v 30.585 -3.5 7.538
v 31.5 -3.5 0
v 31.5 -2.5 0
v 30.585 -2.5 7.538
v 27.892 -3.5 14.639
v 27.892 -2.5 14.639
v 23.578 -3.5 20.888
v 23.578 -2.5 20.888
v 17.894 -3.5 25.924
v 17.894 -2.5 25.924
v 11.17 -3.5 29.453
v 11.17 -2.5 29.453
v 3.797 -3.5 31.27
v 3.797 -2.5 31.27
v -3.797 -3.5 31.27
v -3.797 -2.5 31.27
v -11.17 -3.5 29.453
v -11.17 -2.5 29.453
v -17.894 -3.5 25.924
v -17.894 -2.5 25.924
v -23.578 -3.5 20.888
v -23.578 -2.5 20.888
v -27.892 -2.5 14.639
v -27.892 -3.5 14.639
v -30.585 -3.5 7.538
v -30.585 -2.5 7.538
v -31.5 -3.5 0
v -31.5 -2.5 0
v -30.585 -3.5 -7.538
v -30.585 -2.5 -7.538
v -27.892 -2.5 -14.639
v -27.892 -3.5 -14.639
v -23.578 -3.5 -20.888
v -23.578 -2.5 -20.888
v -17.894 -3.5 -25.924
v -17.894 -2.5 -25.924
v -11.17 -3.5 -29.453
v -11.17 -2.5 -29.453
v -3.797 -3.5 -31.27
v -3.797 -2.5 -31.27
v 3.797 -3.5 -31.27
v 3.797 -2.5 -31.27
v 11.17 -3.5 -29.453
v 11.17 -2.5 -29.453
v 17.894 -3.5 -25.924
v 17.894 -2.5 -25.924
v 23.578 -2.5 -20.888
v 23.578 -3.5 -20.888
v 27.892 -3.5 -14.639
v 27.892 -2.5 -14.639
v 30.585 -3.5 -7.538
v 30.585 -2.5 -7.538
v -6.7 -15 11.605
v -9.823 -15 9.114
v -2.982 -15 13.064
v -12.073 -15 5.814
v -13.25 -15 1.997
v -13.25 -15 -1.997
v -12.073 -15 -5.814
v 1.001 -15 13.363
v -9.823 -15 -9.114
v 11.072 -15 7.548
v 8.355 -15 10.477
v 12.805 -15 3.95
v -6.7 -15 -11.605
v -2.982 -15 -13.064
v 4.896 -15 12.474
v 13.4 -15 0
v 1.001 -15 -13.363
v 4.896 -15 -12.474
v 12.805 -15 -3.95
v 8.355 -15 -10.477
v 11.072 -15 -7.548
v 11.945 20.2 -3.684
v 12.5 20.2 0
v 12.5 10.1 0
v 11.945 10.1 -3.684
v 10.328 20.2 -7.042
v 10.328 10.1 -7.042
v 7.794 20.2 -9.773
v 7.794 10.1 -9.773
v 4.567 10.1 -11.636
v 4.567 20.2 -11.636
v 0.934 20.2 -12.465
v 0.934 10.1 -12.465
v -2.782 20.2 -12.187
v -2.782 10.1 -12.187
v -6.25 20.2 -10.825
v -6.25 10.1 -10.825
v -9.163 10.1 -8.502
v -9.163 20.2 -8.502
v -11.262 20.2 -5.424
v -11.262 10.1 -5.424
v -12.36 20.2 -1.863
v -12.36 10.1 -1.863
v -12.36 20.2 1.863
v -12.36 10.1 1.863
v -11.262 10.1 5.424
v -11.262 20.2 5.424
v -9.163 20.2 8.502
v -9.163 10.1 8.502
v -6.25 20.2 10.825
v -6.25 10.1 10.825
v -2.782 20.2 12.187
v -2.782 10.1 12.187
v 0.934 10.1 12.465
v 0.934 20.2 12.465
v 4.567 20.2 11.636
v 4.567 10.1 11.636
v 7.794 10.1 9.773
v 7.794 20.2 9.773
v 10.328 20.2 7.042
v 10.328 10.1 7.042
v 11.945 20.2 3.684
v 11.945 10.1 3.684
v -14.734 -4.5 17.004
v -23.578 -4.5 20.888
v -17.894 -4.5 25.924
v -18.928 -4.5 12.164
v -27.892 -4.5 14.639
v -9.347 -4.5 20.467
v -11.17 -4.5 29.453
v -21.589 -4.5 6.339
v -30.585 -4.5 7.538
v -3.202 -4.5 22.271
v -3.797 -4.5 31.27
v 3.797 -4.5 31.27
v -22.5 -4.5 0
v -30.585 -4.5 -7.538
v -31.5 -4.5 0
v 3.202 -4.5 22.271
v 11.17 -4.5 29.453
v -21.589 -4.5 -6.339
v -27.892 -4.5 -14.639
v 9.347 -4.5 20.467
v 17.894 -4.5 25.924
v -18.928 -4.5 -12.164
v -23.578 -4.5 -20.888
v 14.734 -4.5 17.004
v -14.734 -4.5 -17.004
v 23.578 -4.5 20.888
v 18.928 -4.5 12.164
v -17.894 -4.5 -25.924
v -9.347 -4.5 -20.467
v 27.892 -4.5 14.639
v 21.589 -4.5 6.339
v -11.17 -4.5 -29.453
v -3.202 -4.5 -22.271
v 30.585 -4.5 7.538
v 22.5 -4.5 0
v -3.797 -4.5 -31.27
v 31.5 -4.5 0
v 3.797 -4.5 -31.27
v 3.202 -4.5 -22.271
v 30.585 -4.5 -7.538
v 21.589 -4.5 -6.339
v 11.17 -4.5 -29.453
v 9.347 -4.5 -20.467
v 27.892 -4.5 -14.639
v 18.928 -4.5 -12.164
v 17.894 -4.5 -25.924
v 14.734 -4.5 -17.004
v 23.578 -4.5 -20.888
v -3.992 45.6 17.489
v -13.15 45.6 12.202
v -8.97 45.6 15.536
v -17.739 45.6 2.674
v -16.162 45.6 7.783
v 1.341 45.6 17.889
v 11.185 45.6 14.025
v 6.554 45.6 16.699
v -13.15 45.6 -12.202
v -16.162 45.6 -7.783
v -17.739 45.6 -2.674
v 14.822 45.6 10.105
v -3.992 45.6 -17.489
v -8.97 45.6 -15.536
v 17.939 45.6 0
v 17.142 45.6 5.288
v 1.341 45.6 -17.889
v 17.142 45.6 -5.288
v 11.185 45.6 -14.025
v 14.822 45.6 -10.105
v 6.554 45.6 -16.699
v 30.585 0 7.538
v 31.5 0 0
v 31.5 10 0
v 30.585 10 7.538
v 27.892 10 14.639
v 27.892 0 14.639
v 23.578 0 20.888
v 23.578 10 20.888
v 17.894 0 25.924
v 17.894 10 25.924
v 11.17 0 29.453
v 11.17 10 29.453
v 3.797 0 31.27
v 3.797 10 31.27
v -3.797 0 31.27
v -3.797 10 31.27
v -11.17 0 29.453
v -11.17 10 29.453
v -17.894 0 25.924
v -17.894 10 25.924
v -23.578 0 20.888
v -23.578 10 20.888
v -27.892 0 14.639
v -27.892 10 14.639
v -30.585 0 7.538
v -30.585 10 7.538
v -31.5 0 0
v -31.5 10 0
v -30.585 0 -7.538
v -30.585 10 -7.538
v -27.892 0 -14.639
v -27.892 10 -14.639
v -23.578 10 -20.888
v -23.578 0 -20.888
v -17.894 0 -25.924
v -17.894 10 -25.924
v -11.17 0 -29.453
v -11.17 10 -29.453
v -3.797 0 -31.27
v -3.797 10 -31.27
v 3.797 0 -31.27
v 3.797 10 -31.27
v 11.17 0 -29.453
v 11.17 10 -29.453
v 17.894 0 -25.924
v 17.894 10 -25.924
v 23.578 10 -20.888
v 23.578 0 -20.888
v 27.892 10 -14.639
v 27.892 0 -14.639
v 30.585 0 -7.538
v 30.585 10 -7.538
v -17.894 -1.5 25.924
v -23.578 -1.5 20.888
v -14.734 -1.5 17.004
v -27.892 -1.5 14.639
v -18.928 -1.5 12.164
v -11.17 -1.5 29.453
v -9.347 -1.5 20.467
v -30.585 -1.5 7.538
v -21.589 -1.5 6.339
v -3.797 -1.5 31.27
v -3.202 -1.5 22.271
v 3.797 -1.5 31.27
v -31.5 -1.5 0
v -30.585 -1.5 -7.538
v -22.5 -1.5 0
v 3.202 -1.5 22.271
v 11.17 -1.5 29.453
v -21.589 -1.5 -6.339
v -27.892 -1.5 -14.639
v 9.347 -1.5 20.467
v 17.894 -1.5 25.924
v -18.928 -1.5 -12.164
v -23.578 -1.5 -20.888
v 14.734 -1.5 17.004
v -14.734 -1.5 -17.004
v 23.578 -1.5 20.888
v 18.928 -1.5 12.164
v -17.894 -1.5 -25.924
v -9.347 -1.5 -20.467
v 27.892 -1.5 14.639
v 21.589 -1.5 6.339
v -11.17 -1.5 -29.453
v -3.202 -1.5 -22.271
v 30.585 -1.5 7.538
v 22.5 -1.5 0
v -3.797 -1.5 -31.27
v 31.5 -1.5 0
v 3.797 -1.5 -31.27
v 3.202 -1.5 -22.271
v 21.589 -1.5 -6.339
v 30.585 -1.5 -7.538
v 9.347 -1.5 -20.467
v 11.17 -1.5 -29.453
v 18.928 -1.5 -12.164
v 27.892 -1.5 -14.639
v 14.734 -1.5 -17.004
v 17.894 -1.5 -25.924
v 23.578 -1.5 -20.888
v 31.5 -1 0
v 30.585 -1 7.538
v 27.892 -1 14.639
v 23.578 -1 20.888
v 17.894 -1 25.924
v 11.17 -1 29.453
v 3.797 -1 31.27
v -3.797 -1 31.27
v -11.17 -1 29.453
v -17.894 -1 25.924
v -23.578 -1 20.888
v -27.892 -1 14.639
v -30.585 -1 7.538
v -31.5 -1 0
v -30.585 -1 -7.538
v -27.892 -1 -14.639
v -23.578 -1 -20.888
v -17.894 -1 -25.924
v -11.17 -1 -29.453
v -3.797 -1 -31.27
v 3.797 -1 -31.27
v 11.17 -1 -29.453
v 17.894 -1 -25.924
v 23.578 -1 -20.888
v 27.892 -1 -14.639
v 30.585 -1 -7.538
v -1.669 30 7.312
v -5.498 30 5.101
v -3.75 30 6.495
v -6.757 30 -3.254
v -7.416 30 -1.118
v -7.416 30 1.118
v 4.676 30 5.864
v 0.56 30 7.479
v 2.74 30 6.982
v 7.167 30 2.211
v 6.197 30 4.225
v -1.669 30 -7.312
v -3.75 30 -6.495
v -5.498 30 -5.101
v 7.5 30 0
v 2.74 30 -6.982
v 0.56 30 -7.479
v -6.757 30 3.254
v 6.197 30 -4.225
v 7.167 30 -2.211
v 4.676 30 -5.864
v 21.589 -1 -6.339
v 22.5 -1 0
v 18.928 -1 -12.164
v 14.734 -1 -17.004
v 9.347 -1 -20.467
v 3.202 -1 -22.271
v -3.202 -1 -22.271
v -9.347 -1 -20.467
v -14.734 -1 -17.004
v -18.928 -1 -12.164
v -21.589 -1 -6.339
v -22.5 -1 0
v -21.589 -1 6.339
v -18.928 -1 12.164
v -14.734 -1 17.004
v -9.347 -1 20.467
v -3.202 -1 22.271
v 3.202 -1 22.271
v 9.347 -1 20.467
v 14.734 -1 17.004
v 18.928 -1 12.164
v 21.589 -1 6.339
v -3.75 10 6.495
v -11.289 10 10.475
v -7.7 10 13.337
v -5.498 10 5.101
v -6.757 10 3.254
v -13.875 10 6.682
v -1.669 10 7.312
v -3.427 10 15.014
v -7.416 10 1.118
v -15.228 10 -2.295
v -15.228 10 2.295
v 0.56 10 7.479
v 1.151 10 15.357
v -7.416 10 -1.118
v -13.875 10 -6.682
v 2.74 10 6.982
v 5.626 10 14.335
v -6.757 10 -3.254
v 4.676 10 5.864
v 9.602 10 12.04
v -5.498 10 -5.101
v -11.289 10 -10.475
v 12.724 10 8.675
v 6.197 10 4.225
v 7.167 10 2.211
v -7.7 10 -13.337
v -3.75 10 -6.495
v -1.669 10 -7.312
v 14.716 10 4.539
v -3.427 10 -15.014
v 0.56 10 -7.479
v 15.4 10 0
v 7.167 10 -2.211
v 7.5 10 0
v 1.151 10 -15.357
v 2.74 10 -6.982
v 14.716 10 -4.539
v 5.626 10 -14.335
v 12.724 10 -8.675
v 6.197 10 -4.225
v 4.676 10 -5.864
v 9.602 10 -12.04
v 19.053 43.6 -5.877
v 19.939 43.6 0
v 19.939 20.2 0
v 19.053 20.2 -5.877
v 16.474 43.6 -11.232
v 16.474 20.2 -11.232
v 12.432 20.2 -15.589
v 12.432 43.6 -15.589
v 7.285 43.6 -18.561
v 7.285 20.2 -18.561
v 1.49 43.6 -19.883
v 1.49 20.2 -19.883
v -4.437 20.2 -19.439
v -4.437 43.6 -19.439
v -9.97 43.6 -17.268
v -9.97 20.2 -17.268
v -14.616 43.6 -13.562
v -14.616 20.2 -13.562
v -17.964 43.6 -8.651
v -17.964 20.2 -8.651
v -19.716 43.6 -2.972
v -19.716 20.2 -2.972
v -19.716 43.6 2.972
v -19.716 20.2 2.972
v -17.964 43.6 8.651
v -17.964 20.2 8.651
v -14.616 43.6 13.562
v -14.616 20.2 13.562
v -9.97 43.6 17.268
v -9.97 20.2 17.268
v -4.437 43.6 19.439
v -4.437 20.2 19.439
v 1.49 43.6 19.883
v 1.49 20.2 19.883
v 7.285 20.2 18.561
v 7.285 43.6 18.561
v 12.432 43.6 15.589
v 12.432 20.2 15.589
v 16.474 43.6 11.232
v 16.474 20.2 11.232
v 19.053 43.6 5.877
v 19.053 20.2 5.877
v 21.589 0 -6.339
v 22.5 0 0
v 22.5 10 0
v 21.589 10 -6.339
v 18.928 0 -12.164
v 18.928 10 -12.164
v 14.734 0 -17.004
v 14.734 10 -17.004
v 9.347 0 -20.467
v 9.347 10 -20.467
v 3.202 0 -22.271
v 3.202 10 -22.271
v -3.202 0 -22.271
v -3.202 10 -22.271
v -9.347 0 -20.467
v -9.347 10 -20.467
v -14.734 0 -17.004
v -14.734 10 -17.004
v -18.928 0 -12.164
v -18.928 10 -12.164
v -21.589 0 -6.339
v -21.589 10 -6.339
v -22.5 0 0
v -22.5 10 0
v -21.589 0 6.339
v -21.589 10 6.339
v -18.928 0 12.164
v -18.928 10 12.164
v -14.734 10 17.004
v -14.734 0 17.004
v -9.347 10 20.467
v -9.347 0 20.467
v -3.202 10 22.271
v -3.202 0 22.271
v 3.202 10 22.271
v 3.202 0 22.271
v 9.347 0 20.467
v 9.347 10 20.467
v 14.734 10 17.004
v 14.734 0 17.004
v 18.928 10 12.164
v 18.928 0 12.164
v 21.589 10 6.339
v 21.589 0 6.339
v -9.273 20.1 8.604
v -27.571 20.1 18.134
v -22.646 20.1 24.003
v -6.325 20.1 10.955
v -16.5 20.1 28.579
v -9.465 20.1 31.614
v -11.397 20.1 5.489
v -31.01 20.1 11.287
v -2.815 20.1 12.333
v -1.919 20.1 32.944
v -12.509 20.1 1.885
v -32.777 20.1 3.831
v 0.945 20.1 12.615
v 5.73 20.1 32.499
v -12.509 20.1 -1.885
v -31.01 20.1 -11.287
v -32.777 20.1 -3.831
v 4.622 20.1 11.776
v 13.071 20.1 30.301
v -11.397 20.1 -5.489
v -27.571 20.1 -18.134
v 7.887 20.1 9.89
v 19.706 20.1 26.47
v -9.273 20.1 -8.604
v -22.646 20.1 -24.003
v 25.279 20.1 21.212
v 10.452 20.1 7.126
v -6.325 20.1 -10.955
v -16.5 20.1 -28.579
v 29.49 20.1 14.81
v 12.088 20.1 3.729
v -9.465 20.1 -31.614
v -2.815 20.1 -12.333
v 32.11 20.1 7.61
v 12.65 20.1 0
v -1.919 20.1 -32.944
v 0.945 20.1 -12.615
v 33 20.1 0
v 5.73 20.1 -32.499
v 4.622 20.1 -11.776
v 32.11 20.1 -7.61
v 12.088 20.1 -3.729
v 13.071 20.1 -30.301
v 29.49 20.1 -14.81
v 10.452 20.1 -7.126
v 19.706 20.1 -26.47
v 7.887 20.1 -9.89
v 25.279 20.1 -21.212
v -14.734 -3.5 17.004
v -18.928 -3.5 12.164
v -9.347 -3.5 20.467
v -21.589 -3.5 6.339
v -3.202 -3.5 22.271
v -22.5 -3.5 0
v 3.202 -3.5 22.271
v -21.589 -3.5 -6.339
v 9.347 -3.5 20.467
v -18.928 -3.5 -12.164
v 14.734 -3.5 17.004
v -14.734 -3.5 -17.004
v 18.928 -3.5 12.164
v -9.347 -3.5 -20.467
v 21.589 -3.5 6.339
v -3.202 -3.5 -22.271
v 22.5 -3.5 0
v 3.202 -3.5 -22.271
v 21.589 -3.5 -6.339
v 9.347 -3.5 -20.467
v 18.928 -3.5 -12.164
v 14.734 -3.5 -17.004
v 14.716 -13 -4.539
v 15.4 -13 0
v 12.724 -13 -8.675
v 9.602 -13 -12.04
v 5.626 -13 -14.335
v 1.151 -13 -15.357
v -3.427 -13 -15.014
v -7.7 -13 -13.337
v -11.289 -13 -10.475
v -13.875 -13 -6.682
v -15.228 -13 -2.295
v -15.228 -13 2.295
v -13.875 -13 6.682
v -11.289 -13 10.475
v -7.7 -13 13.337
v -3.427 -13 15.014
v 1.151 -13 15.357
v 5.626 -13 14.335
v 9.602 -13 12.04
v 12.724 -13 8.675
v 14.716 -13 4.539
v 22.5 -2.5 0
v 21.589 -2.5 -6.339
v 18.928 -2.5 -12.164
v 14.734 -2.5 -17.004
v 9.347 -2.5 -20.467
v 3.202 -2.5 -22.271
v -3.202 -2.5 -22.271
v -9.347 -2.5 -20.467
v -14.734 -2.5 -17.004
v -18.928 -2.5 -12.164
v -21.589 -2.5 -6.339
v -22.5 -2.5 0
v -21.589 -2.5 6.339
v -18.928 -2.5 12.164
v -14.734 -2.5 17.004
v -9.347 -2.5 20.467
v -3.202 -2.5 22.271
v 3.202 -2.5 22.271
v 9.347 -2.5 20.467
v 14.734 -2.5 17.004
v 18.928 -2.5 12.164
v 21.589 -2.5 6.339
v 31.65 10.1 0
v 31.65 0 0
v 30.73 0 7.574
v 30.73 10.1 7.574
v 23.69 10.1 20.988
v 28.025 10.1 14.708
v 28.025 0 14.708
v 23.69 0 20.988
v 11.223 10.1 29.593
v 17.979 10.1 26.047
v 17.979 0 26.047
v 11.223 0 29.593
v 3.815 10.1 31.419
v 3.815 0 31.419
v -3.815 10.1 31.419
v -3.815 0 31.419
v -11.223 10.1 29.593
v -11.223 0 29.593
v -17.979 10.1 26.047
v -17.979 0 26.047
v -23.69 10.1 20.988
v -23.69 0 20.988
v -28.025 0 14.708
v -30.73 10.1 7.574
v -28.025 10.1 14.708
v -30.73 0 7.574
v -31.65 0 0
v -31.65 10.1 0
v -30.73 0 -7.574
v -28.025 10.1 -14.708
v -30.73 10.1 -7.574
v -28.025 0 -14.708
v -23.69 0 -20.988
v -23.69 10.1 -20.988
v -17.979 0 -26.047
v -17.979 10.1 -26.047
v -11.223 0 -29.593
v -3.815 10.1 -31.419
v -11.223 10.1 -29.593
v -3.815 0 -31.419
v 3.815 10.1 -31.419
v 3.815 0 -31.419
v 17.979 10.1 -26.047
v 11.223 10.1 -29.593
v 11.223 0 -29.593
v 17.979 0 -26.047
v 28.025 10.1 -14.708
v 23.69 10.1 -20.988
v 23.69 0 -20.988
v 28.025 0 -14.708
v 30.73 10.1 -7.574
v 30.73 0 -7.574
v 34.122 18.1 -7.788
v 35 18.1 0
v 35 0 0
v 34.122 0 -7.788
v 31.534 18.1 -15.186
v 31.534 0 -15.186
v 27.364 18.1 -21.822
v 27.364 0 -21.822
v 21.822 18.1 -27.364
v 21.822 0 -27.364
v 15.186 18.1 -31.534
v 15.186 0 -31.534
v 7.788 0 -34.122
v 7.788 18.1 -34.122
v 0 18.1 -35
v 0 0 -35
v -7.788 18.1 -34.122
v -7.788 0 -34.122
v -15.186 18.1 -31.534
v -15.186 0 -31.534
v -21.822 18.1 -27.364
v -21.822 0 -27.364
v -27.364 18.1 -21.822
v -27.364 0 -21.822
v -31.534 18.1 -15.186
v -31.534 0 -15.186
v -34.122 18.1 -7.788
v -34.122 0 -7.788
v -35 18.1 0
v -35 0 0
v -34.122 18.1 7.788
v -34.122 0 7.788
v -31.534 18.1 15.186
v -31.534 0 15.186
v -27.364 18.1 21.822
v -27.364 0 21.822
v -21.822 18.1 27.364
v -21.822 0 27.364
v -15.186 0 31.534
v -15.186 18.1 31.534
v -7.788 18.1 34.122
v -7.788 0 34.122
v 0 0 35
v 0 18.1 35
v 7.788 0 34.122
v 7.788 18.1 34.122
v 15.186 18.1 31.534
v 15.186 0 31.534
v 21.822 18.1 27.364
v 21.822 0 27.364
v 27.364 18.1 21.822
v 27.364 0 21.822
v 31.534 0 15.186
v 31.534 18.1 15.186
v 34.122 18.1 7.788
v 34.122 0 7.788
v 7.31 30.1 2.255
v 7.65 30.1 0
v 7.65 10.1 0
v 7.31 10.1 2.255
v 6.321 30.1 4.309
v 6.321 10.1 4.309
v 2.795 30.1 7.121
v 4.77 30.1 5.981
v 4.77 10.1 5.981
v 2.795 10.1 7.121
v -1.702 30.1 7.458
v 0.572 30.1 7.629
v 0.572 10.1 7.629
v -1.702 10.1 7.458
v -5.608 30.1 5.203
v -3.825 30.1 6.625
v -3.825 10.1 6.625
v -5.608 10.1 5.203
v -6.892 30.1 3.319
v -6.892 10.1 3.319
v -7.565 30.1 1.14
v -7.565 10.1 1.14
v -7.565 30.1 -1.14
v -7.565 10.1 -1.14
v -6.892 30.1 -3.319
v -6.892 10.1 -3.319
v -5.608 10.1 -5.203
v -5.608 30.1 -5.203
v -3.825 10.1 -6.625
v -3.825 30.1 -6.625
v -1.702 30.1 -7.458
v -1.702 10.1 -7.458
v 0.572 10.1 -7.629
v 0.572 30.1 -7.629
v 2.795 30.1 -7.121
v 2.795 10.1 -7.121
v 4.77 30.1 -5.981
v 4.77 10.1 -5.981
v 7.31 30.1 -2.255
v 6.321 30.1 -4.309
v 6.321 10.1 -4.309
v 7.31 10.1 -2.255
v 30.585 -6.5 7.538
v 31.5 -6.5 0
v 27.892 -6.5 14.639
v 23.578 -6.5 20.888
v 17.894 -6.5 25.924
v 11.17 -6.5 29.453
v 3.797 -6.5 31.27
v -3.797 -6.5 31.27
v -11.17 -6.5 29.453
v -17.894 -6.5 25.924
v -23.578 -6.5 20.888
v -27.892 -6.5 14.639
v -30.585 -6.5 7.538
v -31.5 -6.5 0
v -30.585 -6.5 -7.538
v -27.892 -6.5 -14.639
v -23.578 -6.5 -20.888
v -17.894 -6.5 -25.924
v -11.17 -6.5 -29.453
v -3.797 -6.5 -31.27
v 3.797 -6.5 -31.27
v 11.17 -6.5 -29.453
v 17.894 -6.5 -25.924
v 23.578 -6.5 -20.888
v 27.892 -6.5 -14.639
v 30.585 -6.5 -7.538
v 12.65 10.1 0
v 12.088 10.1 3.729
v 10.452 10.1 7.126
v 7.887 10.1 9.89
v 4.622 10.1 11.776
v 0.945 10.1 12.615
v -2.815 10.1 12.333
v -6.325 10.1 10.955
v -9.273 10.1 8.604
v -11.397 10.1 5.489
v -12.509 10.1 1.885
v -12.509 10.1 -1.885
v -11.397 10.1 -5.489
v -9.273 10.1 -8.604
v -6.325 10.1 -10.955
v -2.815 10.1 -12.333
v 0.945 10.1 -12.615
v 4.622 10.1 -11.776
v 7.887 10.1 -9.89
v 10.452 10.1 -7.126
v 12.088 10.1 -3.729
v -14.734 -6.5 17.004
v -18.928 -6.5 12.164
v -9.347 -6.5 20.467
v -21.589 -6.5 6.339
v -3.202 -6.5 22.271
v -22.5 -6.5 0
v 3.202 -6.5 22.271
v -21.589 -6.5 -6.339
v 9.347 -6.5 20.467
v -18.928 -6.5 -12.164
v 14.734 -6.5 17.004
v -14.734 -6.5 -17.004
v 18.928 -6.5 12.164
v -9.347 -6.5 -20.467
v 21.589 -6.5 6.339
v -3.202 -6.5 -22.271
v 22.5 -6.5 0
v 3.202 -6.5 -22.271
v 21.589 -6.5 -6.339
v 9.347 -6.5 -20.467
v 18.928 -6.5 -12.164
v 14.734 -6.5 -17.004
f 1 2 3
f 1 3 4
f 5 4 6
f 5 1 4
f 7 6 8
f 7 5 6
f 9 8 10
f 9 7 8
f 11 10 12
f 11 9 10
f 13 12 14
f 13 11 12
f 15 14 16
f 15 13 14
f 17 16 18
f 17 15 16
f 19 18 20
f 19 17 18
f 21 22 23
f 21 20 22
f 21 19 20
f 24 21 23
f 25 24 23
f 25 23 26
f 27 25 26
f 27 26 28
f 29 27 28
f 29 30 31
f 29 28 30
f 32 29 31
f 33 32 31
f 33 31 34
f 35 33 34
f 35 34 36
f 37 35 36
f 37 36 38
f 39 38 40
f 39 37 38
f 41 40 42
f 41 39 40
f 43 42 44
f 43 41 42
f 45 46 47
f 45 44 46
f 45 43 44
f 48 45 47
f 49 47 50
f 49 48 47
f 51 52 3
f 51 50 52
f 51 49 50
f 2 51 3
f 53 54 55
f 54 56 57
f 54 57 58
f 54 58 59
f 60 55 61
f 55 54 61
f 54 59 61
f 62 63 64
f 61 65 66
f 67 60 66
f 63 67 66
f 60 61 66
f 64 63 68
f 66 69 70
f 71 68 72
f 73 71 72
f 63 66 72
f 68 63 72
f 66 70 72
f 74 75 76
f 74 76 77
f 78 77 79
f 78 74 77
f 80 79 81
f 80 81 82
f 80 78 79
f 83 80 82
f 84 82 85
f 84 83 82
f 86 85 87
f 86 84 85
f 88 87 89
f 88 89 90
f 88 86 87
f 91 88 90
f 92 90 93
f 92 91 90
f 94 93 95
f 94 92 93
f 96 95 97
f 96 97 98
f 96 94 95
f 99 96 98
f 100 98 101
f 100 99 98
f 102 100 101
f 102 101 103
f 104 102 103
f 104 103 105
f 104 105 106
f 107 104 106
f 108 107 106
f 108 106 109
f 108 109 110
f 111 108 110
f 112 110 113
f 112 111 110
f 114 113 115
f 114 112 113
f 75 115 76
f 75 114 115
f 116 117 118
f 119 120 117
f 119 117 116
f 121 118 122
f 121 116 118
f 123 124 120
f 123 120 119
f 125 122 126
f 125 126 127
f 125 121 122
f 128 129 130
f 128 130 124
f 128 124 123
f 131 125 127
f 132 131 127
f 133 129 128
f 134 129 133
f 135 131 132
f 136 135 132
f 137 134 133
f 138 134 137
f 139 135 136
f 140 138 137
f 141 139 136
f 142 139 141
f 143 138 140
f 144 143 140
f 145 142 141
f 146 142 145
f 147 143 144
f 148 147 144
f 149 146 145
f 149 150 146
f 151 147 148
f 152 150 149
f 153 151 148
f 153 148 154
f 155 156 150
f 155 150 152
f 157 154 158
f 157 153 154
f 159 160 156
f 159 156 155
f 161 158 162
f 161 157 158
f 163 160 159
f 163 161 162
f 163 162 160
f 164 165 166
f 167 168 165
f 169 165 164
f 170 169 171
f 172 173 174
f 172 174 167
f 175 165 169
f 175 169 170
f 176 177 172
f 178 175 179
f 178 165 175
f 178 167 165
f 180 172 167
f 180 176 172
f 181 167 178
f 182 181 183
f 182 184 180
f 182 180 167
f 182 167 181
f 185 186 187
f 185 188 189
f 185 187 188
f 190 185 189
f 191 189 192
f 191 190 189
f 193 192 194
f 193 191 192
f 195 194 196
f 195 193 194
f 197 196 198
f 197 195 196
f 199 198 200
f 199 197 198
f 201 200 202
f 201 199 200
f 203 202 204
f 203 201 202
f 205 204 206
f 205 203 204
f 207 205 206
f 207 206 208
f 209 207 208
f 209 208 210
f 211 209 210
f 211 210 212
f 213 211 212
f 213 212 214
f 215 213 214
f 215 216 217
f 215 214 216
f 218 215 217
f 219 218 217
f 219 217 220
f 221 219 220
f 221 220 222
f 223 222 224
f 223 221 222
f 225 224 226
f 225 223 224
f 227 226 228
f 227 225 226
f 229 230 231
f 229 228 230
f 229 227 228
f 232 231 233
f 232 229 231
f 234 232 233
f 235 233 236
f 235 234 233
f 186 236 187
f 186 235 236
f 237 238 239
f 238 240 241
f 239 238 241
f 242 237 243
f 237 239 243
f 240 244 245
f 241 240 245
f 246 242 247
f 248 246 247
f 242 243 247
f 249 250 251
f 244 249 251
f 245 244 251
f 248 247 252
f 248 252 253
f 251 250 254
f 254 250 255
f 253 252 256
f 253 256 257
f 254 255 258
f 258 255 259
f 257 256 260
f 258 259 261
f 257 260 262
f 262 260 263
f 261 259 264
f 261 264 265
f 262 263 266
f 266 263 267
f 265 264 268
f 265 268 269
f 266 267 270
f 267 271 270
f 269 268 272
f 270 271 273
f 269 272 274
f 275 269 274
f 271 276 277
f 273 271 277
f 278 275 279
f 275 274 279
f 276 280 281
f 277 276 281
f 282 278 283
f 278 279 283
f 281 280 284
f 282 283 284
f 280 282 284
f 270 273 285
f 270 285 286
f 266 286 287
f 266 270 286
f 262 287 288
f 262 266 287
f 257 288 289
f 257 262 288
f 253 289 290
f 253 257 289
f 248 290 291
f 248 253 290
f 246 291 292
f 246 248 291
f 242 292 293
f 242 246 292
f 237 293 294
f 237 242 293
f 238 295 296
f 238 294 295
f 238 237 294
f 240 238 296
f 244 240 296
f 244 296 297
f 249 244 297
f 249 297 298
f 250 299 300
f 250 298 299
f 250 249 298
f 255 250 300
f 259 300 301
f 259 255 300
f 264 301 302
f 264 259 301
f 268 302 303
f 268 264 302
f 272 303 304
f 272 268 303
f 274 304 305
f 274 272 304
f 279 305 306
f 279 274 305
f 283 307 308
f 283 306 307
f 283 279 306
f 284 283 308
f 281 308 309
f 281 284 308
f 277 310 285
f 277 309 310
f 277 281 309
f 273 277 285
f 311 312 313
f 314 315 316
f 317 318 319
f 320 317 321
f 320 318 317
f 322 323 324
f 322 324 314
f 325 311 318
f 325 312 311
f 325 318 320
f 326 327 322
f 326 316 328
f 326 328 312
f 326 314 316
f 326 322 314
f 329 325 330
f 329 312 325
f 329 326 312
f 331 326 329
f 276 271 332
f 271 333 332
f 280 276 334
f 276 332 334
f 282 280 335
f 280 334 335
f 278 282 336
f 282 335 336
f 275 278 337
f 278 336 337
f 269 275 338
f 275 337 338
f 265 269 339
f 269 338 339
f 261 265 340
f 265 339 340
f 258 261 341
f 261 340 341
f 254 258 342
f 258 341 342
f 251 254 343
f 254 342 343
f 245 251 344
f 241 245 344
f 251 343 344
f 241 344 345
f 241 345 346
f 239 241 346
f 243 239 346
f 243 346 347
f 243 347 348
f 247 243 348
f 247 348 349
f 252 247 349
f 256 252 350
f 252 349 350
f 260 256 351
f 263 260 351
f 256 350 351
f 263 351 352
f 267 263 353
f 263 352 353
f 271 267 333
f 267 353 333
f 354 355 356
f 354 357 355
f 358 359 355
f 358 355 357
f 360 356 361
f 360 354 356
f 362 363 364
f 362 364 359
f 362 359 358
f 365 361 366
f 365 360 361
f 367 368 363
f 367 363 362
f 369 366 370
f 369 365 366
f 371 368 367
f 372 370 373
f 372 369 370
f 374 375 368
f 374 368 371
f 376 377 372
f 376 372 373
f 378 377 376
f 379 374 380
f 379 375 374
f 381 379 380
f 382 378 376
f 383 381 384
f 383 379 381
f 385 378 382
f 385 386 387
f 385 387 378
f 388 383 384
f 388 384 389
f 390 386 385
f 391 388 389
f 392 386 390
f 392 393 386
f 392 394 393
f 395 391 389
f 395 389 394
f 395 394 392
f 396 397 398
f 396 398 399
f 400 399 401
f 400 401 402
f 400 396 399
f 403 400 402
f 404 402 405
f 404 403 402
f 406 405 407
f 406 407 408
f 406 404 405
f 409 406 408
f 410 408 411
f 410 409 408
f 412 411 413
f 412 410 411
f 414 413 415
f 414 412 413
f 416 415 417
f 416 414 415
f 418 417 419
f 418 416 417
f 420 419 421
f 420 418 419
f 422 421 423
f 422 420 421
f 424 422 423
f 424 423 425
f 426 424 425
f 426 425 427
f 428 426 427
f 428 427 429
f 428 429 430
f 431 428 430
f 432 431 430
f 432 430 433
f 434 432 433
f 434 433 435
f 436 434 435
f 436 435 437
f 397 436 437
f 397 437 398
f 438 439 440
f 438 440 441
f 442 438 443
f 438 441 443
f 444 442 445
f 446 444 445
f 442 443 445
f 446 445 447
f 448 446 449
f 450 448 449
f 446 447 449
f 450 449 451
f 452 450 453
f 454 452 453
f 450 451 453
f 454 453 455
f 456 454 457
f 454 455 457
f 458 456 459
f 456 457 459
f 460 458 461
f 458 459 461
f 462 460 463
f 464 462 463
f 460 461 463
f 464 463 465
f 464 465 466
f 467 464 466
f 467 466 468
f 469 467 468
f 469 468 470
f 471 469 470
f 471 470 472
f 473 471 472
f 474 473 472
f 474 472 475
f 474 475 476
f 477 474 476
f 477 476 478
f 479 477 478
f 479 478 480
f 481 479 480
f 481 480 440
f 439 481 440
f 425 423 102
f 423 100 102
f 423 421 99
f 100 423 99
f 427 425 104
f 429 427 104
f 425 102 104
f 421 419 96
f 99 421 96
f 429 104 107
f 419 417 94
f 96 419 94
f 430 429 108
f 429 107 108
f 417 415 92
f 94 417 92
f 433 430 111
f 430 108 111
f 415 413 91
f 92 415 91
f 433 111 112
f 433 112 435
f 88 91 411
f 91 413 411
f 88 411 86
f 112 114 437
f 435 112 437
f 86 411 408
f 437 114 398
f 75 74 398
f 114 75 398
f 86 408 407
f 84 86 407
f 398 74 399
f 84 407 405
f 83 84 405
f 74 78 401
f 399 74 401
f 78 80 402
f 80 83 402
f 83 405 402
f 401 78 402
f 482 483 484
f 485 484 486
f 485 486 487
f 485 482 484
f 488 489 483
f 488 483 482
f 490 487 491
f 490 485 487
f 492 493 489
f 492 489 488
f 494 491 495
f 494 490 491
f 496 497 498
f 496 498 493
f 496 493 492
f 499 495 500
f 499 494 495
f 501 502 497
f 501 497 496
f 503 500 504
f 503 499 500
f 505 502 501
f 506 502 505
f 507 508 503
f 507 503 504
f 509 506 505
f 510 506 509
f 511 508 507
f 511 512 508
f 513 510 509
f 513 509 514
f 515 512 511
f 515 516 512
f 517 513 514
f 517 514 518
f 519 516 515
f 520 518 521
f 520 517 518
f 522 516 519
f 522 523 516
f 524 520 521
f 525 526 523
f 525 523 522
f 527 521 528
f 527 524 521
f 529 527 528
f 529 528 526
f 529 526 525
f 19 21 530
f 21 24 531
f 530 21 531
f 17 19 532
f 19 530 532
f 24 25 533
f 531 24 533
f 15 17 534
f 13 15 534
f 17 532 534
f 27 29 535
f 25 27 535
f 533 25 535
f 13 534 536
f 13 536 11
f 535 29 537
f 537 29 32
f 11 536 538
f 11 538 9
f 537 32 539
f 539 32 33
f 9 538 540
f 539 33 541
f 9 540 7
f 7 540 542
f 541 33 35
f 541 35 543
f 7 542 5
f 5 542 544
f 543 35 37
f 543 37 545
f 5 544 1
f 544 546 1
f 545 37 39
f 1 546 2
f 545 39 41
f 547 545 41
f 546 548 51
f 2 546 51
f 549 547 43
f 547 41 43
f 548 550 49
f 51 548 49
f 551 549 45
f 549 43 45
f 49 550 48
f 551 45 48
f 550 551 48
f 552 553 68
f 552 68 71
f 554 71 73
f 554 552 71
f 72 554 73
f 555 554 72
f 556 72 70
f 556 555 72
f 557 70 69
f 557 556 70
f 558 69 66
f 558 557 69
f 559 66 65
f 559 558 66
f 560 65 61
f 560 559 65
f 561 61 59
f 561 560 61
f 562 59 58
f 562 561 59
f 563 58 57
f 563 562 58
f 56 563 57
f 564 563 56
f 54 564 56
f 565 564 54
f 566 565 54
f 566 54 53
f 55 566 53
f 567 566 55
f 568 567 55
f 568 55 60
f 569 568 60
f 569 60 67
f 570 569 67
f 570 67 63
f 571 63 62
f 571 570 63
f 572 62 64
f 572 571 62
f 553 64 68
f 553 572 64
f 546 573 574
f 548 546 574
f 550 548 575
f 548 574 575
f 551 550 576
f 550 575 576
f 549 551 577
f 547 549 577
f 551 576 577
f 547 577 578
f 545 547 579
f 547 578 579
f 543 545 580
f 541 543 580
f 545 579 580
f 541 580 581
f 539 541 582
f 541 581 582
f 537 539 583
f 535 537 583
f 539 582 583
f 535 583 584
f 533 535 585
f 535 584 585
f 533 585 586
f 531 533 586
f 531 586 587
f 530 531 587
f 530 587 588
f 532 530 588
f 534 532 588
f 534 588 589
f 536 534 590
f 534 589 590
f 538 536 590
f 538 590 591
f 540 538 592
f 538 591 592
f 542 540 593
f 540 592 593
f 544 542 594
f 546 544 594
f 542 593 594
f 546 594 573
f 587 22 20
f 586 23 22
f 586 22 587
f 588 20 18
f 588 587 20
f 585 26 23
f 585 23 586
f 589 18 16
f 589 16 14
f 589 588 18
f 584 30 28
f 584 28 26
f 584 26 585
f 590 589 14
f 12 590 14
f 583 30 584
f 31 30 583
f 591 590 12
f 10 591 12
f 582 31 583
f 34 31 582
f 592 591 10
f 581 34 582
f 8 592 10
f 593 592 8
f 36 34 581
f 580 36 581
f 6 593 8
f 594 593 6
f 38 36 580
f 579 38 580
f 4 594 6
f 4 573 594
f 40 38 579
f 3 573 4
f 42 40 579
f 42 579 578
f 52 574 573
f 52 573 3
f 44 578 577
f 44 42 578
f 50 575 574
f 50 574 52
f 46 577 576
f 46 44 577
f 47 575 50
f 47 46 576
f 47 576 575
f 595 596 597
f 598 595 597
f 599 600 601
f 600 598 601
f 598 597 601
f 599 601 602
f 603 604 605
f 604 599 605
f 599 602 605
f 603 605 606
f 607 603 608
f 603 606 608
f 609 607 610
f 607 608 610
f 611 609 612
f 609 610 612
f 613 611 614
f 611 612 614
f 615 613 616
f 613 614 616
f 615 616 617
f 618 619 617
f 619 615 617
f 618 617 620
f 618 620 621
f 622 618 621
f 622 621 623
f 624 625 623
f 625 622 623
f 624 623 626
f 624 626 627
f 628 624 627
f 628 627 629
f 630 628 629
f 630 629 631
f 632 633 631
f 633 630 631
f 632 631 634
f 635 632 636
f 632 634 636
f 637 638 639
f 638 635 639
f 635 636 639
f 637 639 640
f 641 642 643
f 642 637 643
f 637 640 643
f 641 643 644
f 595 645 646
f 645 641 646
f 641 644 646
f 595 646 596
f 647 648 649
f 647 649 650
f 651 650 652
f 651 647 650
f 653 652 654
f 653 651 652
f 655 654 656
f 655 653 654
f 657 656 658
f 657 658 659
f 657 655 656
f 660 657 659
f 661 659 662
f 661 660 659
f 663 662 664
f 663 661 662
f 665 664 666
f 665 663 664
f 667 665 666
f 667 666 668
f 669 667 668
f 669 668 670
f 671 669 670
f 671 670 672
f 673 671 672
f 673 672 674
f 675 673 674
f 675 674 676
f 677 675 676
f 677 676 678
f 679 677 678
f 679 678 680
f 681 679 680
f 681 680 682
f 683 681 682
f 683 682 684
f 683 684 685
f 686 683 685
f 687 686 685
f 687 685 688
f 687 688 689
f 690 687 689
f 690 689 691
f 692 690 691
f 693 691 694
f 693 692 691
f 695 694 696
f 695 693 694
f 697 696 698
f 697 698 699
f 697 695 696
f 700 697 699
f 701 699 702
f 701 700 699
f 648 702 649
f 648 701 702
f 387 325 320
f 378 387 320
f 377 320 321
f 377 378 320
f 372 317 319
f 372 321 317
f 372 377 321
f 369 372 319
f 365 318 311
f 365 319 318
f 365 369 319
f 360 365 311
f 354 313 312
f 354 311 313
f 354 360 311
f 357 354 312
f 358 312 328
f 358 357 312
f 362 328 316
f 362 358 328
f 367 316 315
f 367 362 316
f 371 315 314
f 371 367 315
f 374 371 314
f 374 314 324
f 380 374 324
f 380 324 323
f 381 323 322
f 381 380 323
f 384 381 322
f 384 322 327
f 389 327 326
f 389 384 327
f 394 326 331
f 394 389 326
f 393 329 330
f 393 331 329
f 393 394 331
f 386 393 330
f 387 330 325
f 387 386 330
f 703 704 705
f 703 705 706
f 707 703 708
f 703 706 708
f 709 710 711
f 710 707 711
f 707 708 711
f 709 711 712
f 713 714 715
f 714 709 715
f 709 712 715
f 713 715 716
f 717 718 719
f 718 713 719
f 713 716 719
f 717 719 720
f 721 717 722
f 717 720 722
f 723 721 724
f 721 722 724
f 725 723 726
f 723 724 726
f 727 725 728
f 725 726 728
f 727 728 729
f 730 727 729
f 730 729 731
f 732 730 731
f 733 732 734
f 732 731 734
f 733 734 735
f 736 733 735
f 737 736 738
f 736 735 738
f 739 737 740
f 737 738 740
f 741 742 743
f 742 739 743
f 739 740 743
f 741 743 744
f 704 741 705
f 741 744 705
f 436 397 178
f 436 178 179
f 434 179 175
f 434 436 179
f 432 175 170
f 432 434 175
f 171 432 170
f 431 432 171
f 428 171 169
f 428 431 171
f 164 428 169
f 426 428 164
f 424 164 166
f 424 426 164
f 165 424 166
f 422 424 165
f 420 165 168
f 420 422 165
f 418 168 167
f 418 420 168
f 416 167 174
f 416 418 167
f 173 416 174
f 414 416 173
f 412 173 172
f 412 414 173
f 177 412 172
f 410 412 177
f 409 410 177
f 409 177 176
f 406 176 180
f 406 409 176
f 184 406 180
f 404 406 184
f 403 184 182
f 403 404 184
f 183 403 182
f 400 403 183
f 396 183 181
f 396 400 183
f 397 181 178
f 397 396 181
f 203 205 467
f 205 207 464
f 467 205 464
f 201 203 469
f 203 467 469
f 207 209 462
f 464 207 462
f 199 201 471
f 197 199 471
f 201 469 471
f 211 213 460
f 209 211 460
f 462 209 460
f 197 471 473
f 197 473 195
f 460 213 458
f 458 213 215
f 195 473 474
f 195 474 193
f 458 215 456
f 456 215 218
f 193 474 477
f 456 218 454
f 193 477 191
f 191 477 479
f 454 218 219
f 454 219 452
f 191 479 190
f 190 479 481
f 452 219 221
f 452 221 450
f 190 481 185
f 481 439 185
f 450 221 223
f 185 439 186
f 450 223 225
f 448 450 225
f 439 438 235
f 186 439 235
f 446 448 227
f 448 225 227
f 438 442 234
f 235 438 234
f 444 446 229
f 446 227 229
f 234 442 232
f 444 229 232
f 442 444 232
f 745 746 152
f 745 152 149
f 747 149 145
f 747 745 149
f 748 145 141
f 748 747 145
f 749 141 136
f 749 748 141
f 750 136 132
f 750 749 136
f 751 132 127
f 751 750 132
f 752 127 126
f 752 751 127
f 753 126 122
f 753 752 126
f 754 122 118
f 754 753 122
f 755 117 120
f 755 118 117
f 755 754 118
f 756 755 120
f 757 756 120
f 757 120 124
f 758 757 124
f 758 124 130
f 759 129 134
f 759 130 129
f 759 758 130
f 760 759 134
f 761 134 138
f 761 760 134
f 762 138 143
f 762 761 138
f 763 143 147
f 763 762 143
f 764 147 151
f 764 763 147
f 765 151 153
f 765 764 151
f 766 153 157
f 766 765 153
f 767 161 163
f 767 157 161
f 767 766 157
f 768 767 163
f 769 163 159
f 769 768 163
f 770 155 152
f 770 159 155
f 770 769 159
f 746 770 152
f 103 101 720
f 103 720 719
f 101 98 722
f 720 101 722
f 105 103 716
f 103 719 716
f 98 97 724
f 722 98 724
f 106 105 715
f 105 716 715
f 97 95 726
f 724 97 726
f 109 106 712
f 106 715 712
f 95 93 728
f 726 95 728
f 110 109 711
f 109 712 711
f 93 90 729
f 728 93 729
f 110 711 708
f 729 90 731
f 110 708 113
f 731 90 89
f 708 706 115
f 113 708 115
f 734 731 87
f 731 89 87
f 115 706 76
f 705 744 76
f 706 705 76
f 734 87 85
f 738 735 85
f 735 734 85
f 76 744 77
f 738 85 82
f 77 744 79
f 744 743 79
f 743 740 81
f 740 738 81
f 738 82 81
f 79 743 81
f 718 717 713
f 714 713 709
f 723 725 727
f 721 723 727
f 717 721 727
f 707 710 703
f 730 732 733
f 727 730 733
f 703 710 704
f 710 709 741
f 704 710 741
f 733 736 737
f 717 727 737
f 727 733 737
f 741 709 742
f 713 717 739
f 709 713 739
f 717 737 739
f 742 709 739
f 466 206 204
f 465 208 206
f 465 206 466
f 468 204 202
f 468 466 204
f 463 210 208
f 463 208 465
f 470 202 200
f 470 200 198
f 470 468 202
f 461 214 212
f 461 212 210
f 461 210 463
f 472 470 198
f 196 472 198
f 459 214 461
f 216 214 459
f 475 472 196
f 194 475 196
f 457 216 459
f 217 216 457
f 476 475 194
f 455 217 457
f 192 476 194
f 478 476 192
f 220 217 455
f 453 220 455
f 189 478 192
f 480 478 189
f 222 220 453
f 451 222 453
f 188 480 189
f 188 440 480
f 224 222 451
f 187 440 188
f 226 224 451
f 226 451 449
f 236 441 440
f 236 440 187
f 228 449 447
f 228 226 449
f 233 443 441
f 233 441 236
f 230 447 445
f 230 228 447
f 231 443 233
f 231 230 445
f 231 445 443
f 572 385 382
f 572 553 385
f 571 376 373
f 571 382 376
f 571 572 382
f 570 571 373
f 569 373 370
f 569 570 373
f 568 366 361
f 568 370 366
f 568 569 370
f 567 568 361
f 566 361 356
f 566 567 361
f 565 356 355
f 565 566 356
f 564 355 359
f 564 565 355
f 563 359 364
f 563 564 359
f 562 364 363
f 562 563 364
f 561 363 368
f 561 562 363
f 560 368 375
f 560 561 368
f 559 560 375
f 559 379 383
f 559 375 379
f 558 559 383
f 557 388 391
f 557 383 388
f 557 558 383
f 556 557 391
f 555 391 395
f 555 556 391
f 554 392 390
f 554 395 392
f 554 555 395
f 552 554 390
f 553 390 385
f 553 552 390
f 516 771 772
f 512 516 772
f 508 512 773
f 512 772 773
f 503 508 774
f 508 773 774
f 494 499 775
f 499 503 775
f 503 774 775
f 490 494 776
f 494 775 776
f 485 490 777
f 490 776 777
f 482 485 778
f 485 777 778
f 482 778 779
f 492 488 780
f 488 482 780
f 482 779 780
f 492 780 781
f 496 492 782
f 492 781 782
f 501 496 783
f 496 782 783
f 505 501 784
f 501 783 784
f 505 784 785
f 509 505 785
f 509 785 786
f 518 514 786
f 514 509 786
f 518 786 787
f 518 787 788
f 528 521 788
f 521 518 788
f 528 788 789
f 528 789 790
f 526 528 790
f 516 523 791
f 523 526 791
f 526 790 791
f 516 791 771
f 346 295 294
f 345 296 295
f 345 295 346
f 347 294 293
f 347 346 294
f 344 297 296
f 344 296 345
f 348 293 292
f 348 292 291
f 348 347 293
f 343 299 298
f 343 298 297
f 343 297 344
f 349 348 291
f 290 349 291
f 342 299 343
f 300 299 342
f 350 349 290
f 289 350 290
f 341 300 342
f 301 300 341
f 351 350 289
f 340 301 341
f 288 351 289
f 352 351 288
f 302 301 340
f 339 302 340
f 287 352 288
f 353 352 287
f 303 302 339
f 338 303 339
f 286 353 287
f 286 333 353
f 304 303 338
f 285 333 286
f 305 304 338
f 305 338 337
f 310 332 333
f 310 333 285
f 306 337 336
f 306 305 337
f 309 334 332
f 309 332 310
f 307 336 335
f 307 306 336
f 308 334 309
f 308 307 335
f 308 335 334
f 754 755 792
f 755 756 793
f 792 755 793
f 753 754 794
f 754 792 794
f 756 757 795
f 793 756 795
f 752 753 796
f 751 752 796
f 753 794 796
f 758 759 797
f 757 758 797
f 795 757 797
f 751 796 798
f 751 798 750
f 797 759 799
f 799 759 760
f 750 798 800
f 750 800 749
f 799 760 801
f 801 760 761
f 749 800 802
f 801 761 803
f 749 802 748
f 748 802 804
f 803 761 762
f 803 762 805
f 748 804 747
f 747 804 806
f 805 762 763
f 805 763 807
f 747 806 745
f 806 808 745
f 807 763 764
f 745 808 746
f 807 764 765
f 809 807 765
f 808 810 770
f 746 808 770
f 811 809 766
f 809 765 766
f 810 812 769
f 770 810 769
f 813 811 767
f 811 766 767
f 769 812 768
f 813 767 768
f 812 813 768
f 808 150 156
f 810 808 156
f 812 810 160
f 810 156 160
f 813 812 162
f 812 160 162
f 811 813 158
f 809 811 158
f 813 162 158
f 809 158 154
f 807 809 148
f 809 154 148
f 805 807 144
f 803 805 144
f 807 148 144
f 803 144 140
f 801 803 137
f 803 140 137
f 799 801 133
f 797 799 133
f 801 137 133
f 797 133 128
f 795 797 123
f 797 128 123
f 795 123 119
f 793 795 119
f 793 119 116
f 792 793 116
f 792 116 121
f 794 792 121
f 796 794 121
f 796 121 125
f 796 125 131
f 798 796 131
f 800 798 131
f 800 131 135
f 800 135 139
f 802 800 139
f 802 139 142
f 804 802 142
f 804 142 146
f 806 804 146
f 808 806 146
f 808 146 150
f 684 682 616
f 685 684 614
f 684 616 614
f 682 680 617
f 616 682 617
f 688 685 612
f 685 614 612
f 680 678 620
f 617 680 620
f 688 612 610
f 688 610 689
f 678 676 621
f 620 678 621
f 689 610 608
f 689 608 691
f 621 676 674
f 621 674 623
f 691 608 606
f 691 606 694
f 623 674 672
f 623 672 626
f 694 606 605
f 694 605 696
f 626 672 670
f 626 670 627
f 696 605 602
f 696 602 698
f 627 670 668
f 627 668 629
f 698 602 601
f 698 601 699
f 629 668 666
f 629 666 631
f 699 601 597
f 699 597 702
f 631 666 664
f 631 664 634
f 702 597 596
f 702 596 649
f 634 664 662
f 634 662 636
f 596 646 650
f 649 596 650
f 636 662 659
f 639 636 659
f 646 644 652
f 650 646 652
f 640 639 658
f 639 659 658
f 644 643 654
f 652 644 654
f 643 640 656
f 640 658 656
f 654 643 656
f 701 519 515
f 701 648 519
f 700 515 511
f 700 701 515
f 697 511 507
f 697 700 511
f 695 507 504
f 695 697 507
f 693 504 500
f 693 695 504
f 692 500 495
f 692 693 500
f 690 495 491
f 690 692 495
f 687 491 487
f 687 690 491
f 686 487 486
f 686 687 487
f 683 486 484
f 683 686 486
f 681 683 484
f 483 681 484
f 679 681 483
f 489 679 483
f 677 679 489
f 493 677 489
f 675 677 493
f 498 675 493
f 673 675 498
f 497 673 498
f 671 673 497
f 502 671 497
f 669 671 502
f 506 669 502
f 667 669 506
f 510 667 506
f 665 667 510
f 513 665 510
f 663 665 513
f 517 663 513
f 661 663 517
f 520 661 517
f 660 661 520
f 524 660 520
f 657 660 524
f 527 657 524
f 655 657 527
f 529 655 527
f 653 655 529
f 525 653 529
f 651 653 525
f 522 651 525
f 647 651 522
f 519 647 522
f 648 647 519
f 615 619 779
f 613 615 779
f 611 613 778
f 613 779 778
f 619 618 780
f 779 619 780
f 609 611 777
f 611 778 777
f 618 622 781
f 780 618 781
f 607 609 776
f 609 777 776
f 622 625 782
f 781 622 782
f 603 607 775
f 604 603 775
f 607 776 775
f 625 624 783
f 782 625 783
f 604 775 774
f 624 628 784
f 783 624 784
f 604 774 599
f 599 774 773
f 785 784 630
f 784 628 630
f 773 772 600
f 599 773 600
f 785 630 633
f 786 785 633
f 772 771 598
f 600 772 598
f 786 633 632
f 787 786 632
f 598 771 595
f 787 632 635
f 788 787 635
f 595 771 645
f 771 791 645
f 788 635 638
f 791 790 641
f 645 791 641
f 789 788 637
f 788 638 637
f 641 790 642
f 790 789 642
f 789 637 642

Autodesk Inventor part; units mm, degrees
ref_plane "YZ Plane" through (0, 0, 0) normal (1, 0, 0) x (0, 1, 0)
ref_plane "XZ Plane" through (0, 0, 0) normal (0, 1, 0) x (-1, 0, 0)
ref_plane "XY Plane" through (0, 0, 0) normal (0, 0, 1) x (1, 0, 0)
sketch "Sketch1" plane through (0, 0, 0) normal (0, 0, 1) x (1, 0, 0)
  line L0 (31.65, 0) -> (35, 0)
  line L1 (35, 0) -> (35, 20.1)
  line L2 (35, 20.1) -> (12.65, 20.1)
  line L3 (12.65, 20.1) -> (12.65, 10.1)
  line L4 (12.65, 10.1) -> (31.65, 10.1)
  line L5 (31.65, 10.1) -> (31.65, 0)
  line L6 (22.5, 10) -> (31.5, 10)
  line L7 (31.5, 10) -> (31.5, 0)
  line L8 (31.5, 0) -> (22.5, 0)
  line L9 (22.5, 0) -> (22.5, 10)
  line L10 (12.5, 10.1) -> (12.5, 20.2)
  line L11 (12.5, 20.2) -> (19.939, 20.2)
  line L12 (19.939, 20.2) -> (19.939, 45.6)
  line L13 (19.939, 45.6) -> (0, 45.6)
  line L14 (7.65, 30.1) -> (7.65, 10.1)
  line L15 (7.65, 10.1) -> (12.5, 10.1)
  line L16 (0, 30) -> (7.5, 30)
  line L17 (7.5, 30) -> (7.5, 10)
  line L18 (7.5, 10) -> (15.4, 10)
  line L19 (15.4, 10) -> (15.4, -15)
  line L20 (15.4, -15) -> (0, -15)
  line L21 (0, -15) -> (0, 30)
  line L22 (22.5, -2.5) -> (31.5, -2.5)
  line L23 (31.5, -2.5) -> (31.5, -3.5)
  line L24 (31.5, -3.5) -> (22.5, -3.5)
  line L25 (22.5, -3.5) -> (22.5, -2.5)
  line L26 (22.5, -4.5) -> (31.5, -4.5)
  line L27 (31.5, -4.5) -> (31.5, -6.5)
  line L28 (31.5, -6.5) -> (22.5, -6.5)
  line L29 (22.5, -6.5) -> (22.5, -4.5)
  line L30 (22.5, -1) -> (31.5, -1)
  line L31 (31.5, -1) -> (31.5, -1.5)
  line L32 (31.5, -1.5) -> (22.5, -1.5)
  line L33 (22.5, -1.5) -> (22.5, -1)
  line L34 (0, 45.6) -> (0, 30.1)
  line L35 (0, 30.1) -> (7.65, 30.1)
  point P0 (0, 0)
  dimension "d0" = 35
  dimension "d1" = 19.939
  dimension "d2" = 12.5
  dimension "d3" = 7.5
  dimension "d5" = 22.5
  dimension "d7" = 31.5
  dimension "d8" = 0.1
  dimension "d9" = 0.15
  dimension "d10" = 10
  dimension "d11" = 0.15
  dimension "d12" = 0.1
  dimension "d13" = 10
  dimension "d14" = 0.15
  dimension "d15" = 0.1
  dimension "d16" = 25.4
  dimension "d17" = 20
  dimension "d19" = 15
  dimension "d20" = 15.4
  dimension "d21" = 1
  dimension "d22" = 2
  dimension "d23" = 0.5
  dimension "d24" = 1
  dimension "d25" = 1
  dimension "d26" = 1
  dimension "d27" = 0.1
revolve "Revolution1" add sketch "Sketch1" angle 360 about axis through (0, -15, 0) along (0, 1, 0)
chamfer "Chamfer1" distance 2 angle 45 3 edges at (-19.939, 45.6, 0) (-35, 20.1, 0) (-15.4, -15, 0)
equation "\"d8\" = y_tol"
equation "\"d9\" = x_tol"
equation "\"d11\" = x_tol"
equation "\"d12\" = y_tol"
equation "\"d14\" = x_tol"
equation "\"d15\" = y_tol"
equation "\"d27\" = y_tol"
equation "\"x_tol\" = 0.15"
equation "\"y_tol\" = 0.1"
properties part number "for_09G_-_axle_seal_installer"
